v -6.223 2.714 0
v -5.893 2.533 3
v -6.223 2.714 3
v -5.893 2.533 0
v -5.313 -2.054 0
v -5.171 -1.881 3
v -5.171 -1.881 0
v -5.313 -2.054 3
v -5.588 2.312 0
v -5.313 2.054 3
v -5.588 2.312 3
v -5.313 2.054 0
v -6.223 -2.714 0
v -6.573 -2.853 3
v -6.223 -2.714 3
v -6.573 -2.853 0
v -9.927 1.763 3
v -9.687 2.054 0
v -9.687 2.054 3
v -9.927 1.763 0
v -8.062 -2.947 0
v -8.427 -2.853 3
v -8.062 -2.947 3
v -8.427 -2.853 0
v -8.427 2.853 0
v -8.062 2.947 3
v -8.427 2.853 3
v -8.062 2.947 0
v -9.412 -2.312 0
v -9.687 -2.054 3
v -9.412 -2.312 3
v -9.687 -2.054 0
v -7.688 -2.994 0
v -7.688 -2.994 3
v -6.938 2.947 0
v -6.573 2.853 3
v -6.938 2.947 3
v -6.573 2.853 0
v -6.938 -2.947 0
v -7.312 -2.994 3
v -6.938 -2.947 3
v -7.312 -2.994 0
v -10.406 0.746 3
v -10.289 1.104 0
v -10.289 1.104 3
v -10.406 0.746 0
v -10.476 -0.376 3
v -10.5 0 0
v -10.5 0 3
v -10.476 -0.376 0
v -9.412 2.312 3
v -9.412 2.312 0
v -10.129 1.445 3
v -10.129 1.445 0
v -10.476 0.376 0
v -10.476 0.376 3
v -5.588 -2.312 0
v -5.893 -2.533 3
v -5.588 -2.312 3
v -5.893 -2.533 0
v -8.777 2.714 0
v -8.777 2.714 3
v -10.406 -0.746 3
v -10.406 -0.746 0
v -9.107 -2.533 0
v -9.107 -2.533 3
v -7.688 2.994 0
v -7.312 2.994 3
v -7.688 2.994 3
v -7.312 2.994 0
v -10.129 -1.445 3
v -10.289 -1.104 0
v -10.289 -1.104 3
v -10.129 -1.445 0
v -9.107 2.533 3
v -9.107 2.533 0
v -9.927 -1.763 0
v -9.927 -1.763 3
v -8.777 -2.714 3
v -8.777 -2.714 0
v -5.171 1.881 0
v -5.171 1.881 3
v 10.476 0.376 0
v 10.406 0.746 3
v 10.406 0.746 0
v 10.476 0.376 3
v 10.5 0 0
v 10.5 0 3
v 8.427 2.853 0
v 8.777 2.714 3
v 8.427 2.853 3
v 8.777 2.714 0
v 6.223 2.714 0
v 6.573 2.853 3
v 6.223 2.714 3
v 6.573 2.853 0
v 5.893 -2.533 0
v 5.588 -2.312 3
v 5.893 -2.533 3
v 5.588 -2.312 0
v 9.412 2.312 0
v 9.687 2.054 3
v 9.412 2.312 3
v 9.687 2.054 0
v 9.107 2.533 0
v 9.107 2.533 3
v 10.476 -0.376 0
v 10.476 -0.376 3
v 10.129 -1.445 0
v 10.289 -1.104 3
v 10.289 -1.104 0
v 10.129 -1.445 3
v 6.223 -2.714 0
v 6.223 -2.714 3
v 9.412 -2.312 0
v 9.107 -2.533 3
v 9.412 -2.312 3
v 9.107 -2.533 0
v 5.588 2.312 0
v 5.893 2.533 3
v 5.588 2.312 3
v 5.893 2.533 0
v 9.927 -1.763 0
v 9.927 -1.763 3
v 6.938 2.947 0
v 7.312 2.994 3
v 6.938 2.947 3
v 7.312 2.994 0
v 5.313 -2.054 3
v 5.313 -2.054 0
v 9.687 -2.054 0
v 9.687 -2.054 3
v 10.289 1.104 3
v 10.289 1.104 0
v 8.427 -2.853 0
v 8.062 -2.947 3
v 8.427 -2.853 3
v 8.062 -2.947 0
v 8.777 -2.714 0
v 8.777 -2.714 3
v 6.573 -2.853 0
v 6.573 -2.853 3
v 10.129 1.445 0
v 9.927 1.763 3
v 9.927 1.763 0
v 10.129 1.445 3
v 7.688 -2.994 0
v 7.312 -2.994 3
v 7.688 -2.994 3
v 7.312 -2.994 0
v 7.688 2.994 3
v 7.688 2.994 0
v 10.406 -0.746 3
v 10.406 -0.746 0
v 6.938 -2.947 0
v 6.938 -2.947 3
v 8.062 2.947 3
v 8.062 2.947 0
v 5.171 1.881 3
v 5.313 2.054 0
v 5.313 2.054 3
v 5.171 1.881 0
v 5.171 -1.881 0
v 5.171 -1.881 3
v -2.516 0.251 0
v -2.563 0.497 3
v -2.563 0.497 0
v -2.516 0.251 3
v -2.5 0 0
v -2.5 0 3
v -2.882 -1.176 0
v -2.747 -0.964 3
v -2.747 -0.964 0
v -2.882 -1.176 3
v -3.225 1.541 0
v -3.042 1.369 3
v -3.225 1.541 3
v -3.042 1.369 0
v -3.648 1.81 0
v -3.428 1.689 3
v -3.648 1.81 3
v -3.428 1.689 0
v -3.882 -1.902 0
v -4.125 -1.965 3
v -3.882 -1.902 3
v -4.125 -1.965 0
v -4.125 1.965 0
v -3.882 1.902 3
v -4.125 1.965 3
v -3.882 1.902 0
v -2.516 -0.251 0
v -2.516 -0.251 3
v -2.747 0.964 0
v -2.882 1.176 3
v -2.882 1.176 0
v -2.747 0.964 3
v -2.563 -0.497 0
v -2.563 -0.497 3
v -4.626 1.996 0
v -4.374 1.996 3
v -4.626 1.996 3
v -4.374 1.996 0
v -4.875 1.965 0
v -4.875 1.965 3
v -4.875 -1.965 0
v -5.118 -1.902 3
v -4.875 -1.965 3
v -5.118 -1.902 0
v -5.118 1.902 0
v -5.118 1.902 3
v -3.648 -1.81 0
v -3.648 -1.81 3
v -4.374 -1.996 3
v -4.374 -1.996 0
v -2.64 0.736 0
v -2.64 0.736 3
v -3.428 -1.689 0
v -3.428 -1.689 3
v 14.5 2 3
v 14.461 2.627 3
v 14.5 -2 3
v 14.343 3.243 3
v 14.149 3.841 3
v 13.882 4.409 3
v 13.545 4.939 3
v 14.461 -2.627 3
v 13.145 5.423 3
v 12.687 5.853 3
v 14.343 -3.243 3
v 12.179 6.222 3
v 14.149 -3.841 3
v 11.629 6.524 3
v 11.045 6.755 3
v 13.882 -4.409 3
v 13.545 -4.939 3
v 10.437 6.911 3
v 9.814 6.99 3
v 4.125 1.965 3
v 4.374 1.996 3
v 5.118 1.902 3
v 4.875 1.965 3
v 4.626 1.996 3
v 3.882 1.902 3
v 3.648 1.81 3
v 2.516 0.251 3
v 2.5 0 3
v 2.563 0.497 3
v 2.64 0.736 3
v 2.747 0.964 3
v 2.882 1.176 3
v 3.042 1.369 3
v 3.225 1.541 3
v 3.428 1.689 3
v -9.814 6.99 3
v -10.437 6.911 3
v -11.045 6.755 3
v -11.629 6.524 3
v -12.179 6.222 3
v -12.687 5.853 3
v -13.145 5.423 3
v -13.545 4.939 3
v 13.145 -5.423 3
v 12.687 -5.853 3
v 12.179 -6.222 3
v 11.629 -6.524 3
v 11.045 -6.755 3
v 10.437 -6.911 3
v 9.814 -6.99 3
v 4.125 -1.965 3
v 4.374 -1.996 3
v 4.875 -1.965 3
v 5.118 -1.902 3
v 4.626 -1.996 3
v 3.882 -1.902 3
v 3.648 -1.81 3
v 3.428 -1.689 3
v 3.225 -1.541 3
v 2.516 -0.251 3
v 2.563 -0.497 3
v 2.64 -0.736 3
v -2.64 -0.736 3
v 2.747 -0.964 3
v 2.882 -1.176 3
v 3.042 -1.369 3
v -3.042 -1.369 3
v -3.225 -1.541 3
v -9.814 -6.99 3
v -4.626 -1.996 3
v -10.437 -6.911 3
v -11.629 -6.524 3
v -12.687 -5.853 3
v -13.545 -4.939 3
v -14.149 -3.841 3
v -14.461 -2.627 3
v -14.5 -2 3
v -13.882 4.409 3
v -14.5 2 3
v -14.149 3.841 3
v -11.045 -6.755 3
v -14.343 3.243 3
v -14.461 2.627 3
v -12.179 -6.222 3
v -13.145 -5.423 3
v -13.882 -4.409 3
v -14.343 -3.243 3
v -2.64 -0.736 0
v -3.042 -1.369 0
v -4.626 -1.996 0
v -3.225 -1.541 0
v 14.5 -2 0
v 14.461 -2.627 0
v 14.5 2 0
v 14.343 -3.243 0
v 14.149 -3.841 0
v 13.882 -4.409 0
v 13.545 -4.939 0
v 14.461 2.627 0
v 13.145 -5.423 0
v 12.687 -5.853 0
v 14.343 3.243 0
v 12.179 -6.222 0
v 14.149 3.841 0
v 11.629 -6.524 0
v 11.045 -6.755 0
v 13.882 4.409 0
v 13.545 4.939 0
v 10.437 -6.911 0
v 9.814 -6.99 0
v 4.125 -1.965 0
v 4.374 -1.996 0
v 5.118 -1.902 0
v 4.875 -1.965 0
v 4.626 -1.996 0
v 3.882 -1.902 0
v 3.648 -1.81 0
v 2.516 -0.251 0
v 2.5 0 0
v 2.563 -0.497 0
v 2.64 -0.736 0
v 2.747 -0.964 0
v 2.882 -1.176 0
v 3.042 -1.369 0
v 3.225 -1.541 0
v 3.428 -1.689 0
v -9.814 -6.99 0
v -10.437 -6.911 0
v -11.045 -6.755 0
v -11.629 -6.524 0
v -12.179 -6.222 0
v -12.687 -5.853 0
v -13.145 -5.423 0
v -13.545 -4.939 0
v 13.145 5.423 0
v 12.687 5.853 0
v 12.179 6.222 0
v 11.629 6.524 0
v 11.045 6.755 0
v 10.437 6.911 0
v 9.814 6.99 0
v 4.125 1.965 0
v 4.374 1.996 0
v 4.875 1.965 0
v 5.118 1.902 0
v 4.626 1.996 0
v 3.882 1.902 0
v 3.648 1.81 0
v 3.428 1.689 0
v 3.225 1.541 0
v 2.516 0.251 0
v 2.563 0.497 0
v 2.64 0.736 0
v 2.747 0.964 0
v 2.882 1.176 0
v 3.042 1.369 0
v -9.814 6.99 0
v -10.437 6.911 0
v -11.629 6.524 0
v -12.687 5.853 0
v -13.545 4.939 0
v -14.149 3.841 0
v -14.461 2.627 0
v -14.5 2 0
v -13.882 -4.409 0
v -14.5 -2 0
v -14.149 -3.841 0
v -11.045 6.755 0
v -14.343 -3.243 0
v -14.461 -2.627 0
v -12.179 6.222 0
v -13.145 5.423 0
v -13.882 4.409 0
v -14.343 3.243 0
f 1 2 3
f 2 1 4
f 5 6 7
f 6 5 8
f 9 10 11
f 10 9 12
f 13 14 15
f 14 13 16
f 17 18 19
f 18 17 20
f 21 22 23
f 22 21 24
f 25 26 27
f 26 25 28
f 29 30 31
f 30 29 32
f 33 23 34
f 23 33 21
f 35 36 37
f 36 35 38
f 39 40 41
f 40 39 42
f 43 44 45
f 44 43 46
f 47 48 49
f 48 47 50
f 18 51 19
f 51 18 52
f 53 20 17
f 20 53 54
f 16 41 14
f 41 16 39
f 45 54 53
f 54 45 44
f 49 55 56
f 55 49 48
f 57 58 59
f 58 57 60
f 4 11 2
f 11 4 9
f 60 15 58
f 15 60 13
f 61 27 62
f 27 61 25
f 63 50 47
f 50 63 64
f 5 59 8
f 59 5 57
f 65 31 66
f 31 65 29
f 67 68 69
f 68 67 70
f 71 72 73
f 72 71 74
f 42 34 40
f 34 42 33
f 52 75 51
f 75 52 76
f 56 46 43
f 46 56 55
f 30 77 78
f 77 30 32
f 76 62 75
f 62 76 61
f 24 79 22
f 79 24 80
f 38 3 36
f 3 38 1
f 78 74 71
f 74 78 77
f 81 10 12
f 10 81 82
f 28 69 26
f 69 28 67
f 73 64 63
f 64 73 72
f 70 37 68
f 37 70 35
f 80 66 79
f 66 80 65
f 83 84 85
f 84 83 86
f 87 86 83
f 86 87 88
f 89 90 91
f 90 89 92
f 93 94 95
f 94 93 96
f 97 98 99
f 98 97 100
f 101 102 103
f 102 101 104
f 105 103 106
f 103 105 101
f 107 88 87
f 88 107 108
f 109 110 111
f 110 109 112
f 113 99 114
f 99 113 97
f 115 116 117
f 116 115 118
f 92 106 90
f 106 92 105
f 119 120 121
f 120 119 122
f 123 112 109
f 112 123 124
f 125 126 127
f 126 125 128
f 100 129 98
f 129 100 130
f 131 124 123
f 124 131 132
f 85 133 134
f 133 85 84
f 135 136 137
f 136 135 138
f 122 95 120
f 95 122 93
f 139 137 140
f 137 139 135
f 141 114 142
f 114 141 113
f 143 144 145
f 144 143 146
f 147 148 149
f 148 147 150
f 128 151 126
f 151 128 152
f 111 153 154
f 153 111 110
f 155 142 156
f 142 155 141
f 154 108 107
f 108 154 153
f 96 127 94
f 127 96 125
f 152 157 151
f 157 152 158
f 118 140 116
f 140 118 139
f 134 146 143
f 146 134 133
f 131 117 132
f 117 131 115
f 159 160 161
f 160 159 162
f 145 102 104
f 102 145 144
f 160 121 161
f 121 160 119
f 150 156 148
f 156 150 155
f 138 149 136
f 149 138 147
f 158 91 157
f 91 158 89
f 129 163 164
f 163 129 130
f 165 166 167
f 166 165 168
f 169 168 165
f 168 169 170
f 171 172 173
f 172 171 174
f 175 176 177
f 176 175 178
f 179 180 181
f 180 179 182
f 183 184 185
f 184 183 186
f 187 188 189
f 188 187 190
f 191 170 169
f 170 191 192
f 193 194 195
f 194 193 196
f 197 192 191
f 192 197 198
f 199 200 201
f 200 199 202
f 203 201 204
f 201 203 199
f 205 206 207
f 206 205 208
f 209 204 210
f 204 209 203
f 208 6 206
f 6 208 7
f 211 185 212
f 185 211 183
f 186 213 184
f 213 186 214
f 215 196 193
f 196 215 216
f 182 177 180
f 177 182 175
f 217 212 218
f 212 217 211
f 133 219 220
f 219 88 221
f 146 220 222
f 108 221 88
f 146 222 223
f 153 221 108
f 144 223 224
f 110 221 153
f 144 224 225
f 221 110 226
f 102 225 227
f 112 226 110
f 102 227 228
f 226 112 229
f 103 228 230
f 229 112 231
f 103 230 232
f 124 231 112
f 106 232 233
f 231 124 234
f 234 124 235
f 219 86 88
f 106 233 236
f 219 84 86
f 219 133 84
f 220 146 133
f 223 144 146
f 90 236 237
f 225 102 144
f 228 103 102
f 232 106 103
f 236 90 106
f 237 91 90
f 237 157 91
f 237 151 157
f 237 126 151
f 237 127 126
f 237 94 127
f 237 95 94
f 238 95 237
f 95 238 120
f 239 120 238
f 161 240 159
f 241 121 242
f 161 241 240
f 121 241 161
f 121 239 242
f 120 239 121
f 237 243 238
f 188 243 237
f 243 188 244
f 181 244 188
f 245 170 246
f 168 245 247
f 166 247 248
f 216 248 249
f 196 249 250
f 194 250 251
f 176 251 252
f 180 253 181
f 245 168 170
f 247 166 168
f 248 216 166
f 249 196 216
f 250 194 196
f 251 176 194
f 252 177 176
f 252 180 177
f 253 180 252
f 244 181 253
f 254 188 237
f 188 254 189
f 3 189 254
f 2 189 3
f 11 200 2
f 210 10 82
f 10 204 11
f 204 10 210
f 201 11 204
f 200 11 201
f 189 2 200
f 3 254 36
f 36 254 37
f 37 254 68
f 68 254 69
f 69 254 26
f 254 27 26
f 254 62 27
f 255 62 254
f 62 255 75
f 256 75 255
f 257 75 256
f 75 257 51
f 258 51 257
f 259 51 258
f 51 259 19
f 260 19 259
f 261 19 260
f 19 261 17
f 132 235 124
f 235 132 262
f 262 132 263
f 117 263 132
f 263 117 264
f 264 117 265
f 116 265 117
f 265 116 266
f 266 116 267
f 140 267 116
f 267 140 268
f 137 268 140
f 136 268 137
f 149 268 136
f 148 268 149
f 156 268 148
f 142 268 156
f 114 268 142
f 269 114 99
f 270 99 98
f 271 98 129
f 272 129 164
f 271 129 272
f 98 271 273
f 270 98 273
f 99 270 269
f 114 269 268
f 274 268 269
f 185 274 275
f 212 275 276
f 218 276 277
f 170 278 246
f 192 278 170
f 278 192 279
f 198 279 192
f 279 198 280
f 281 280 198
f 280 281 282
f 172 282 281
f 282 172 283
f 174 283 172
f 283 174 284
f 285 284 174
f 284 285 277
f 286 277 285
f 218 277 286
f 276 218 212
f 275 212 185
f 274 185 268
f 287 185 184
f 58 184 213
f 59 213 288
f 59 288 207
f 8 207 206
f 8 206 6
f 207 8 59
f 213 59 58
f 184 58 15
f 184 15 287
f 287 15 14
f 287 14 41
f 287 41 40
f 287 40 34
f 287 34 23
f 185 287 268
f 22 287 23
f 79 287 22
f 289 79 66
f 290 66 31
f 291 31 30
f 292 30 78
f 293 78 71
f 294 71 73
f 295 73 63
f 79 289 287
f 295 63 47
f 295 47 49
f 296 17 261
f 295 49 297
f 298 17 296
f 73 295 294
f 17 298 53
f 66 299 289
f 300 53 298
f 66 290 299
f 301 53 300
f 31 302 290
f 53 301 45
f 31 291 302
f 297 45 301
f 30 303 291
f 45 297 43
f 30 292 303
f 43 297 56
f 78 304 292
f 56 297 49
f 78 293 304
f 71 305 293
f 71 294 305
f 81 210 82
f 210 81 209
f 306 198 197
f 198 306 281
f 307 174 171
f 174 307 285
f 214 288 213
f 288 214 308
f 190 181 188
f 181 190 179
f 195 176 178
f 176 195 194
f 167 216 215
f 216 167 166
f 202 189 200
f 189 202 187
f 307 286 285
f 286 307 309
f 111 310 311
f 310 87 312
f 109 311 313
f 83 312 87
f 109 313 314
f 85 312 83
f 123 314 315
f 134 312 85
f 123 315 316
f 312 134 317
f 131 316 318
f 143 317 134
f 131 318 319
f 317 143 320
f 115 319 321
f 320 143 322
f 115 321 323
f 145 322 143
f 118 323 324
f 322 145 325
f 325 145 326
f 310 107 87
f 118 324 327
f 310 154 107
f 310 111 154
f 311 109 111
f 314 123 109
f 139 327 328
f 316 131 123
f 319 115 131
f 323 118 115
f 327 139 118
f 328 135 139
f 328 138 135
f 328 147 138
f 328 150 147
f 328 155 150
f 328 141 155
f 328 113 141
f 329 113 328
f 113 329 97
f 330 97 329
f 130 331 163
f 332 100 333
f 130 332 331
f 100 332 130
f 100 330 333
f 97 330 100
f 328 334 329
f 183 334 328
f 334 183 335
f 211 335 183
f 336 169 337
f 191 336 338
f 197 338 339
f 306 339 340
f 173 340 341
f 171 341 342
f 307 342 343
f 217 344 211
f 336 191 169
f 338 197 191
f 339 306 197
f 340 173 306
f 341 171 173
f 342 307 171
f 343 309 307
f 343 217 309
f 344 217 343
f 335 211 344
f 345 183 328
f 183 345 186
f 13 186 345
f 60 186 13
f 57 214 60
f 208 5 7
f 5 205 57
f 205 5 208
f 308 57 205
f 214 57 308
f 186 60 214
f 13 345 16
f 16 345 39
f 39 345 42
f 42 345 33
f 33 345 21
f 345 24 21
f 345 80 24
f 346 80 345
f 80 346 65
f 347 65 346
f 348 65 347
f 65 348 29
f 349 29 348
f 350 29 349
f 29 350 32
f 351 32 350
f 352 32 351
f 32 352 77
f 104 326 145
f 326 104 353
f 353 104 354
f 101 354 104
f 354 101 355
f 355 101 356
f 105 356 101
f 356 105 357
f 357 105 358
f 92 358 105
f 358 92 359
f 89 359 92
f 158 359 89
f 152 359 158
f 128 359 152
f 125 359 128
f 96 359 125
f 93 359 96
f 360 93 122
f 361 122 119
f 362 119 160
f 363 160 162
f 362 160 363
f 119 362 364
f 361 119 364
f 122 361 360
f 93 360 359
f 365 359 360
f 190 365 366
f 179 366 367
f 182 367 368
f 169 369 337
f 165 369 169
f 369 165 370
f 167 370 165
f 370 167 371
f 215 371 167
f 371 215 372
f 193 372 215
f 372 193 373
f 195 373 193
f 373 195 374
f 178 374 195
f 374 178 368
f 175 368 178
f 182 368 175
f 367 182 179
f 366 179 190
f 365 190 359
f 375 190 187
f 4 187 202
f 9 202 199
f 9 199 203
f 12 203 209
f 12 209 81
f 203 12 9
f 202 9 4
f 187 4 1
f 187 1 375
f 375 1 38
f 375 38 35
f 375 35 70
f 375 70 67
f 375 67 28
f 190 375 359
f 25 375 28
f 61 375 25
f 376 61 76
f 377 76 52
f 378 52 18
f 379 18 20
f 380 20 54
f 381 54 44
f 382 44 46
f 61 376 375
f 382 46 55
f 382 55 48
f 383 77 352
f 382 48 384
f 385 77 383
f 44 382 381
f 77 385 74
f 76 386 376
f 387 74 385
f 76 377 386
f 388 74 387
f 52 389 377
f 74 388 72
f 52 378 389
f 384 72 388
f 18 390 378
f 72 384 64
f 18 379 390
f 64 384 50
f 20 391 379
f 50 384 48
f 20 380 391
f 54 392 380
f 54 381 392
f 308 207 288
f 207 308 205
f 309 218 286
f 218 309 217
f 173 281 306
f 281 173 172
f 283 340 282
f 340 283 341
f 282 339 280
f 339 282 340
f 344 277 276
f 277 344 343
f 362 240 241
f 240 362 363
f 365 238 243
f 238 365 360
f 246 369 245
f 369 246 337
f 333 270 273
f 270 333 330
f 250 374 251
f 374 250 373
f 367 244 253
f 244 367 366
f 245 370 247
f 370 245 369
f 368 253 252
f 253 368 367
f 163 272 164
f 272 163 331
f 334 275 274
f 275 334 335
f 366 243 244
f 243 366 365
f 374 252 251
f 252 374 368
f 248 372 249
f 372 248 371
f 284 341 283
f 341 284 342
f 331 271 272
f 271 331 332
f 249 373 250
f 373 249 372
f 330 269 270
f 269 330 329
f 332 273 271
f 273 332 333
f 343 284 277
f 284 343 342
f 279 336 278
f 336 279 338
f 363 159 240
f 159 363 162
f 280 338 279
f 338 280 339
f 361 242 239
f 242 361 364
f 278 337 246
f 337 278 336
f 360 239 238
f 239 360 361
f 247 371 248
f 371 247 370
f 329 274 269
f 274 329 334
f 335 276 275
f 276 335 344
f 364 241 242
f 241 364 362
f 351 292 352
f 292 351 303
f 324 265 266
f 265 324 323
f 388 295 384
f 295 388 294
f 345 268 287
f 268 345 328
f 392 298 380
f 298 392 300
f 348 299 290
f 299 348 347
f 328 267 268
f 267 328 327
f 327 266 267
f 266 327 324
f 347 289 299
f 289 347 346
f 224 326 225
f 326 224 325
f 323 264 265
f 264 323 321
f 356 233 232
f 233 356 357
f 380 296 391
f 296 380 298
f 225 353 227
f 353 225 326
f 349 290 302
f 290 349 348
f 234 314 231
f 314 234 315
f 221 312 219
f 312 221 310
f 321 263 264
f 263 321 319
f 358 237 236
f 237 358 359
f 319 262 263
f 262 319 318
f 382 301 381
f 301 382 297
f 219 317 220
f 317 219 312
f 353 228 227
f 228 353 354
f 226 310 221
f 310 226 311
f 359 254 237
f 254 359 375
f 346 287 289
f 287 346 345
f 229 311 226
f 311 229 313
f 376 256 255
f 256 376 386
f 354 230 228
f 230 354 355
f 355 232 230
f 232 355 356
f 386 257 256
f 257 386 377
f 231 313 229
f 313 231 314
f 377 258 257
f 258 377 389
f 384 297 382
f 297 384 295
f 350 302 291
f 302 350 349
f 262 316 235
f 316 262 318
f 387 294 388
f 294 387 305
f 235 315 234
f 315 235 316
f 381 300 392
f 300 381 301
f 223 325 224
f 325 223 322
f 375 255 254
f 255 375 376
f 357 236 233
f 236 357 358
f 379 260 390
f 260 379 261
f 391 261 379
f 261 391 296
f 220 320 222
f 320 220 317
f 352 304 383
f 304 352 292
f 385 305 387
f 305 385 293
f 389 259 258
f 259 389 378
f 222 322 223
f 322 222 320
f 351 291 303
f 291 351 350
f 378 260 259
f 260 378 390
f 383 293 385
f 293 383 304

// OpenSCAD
$fn = 50;


difference() {
	union() {
		hull() {
			translate(v = [-9.5000000000, 2.0000000000, 0]) {
				cylinder(h = 3, r = 5);
			}
			translate(v = [9.5000000000, 2.0000000000, 0]) {
				cylinder(h = 3, r = 5);
			}
			translate(v = [-9.5000000000, -2.0000000000, 0]) {
				cylinder(h = 3, r = 5);
			}
			translate(v = [9.5000000000, -2.0000000000, 0]) {
				cylinder(h = 3, r = 5);
			}
		}
	}
	union() {
		#translate(v = [-7.5000000000, 0.0000000000, -100.0000000000]) {
			cylinder(h = 200, r = 3.0000000000);
		}
		#translate(v = [-7.5000000000, 0.0000000000, -100.0000000000]) {
			cylinder(h = 200, r = 3.0000000000);
		}
		#translate(v = [7.5000000000, 0.0000000000, -100.0000000000]) {
			cylinder(h = 200, r = 3.0000000000);
		}
		#translate(v = [7.5000000000, 0.0000000000, -100.0000000000]) {
			cylinder(h = 200, r = 3.0000000000);
		}
		#translate(v = [-4.5000000000, 0, 0]) {
			cylinder(h = 3, r = 2.0000000000);
		}
		#translate(v = [4.5000000000, 0, 0]) {
			cylinder(h = 3, r = 2.0000000000);
		}
	}
}
